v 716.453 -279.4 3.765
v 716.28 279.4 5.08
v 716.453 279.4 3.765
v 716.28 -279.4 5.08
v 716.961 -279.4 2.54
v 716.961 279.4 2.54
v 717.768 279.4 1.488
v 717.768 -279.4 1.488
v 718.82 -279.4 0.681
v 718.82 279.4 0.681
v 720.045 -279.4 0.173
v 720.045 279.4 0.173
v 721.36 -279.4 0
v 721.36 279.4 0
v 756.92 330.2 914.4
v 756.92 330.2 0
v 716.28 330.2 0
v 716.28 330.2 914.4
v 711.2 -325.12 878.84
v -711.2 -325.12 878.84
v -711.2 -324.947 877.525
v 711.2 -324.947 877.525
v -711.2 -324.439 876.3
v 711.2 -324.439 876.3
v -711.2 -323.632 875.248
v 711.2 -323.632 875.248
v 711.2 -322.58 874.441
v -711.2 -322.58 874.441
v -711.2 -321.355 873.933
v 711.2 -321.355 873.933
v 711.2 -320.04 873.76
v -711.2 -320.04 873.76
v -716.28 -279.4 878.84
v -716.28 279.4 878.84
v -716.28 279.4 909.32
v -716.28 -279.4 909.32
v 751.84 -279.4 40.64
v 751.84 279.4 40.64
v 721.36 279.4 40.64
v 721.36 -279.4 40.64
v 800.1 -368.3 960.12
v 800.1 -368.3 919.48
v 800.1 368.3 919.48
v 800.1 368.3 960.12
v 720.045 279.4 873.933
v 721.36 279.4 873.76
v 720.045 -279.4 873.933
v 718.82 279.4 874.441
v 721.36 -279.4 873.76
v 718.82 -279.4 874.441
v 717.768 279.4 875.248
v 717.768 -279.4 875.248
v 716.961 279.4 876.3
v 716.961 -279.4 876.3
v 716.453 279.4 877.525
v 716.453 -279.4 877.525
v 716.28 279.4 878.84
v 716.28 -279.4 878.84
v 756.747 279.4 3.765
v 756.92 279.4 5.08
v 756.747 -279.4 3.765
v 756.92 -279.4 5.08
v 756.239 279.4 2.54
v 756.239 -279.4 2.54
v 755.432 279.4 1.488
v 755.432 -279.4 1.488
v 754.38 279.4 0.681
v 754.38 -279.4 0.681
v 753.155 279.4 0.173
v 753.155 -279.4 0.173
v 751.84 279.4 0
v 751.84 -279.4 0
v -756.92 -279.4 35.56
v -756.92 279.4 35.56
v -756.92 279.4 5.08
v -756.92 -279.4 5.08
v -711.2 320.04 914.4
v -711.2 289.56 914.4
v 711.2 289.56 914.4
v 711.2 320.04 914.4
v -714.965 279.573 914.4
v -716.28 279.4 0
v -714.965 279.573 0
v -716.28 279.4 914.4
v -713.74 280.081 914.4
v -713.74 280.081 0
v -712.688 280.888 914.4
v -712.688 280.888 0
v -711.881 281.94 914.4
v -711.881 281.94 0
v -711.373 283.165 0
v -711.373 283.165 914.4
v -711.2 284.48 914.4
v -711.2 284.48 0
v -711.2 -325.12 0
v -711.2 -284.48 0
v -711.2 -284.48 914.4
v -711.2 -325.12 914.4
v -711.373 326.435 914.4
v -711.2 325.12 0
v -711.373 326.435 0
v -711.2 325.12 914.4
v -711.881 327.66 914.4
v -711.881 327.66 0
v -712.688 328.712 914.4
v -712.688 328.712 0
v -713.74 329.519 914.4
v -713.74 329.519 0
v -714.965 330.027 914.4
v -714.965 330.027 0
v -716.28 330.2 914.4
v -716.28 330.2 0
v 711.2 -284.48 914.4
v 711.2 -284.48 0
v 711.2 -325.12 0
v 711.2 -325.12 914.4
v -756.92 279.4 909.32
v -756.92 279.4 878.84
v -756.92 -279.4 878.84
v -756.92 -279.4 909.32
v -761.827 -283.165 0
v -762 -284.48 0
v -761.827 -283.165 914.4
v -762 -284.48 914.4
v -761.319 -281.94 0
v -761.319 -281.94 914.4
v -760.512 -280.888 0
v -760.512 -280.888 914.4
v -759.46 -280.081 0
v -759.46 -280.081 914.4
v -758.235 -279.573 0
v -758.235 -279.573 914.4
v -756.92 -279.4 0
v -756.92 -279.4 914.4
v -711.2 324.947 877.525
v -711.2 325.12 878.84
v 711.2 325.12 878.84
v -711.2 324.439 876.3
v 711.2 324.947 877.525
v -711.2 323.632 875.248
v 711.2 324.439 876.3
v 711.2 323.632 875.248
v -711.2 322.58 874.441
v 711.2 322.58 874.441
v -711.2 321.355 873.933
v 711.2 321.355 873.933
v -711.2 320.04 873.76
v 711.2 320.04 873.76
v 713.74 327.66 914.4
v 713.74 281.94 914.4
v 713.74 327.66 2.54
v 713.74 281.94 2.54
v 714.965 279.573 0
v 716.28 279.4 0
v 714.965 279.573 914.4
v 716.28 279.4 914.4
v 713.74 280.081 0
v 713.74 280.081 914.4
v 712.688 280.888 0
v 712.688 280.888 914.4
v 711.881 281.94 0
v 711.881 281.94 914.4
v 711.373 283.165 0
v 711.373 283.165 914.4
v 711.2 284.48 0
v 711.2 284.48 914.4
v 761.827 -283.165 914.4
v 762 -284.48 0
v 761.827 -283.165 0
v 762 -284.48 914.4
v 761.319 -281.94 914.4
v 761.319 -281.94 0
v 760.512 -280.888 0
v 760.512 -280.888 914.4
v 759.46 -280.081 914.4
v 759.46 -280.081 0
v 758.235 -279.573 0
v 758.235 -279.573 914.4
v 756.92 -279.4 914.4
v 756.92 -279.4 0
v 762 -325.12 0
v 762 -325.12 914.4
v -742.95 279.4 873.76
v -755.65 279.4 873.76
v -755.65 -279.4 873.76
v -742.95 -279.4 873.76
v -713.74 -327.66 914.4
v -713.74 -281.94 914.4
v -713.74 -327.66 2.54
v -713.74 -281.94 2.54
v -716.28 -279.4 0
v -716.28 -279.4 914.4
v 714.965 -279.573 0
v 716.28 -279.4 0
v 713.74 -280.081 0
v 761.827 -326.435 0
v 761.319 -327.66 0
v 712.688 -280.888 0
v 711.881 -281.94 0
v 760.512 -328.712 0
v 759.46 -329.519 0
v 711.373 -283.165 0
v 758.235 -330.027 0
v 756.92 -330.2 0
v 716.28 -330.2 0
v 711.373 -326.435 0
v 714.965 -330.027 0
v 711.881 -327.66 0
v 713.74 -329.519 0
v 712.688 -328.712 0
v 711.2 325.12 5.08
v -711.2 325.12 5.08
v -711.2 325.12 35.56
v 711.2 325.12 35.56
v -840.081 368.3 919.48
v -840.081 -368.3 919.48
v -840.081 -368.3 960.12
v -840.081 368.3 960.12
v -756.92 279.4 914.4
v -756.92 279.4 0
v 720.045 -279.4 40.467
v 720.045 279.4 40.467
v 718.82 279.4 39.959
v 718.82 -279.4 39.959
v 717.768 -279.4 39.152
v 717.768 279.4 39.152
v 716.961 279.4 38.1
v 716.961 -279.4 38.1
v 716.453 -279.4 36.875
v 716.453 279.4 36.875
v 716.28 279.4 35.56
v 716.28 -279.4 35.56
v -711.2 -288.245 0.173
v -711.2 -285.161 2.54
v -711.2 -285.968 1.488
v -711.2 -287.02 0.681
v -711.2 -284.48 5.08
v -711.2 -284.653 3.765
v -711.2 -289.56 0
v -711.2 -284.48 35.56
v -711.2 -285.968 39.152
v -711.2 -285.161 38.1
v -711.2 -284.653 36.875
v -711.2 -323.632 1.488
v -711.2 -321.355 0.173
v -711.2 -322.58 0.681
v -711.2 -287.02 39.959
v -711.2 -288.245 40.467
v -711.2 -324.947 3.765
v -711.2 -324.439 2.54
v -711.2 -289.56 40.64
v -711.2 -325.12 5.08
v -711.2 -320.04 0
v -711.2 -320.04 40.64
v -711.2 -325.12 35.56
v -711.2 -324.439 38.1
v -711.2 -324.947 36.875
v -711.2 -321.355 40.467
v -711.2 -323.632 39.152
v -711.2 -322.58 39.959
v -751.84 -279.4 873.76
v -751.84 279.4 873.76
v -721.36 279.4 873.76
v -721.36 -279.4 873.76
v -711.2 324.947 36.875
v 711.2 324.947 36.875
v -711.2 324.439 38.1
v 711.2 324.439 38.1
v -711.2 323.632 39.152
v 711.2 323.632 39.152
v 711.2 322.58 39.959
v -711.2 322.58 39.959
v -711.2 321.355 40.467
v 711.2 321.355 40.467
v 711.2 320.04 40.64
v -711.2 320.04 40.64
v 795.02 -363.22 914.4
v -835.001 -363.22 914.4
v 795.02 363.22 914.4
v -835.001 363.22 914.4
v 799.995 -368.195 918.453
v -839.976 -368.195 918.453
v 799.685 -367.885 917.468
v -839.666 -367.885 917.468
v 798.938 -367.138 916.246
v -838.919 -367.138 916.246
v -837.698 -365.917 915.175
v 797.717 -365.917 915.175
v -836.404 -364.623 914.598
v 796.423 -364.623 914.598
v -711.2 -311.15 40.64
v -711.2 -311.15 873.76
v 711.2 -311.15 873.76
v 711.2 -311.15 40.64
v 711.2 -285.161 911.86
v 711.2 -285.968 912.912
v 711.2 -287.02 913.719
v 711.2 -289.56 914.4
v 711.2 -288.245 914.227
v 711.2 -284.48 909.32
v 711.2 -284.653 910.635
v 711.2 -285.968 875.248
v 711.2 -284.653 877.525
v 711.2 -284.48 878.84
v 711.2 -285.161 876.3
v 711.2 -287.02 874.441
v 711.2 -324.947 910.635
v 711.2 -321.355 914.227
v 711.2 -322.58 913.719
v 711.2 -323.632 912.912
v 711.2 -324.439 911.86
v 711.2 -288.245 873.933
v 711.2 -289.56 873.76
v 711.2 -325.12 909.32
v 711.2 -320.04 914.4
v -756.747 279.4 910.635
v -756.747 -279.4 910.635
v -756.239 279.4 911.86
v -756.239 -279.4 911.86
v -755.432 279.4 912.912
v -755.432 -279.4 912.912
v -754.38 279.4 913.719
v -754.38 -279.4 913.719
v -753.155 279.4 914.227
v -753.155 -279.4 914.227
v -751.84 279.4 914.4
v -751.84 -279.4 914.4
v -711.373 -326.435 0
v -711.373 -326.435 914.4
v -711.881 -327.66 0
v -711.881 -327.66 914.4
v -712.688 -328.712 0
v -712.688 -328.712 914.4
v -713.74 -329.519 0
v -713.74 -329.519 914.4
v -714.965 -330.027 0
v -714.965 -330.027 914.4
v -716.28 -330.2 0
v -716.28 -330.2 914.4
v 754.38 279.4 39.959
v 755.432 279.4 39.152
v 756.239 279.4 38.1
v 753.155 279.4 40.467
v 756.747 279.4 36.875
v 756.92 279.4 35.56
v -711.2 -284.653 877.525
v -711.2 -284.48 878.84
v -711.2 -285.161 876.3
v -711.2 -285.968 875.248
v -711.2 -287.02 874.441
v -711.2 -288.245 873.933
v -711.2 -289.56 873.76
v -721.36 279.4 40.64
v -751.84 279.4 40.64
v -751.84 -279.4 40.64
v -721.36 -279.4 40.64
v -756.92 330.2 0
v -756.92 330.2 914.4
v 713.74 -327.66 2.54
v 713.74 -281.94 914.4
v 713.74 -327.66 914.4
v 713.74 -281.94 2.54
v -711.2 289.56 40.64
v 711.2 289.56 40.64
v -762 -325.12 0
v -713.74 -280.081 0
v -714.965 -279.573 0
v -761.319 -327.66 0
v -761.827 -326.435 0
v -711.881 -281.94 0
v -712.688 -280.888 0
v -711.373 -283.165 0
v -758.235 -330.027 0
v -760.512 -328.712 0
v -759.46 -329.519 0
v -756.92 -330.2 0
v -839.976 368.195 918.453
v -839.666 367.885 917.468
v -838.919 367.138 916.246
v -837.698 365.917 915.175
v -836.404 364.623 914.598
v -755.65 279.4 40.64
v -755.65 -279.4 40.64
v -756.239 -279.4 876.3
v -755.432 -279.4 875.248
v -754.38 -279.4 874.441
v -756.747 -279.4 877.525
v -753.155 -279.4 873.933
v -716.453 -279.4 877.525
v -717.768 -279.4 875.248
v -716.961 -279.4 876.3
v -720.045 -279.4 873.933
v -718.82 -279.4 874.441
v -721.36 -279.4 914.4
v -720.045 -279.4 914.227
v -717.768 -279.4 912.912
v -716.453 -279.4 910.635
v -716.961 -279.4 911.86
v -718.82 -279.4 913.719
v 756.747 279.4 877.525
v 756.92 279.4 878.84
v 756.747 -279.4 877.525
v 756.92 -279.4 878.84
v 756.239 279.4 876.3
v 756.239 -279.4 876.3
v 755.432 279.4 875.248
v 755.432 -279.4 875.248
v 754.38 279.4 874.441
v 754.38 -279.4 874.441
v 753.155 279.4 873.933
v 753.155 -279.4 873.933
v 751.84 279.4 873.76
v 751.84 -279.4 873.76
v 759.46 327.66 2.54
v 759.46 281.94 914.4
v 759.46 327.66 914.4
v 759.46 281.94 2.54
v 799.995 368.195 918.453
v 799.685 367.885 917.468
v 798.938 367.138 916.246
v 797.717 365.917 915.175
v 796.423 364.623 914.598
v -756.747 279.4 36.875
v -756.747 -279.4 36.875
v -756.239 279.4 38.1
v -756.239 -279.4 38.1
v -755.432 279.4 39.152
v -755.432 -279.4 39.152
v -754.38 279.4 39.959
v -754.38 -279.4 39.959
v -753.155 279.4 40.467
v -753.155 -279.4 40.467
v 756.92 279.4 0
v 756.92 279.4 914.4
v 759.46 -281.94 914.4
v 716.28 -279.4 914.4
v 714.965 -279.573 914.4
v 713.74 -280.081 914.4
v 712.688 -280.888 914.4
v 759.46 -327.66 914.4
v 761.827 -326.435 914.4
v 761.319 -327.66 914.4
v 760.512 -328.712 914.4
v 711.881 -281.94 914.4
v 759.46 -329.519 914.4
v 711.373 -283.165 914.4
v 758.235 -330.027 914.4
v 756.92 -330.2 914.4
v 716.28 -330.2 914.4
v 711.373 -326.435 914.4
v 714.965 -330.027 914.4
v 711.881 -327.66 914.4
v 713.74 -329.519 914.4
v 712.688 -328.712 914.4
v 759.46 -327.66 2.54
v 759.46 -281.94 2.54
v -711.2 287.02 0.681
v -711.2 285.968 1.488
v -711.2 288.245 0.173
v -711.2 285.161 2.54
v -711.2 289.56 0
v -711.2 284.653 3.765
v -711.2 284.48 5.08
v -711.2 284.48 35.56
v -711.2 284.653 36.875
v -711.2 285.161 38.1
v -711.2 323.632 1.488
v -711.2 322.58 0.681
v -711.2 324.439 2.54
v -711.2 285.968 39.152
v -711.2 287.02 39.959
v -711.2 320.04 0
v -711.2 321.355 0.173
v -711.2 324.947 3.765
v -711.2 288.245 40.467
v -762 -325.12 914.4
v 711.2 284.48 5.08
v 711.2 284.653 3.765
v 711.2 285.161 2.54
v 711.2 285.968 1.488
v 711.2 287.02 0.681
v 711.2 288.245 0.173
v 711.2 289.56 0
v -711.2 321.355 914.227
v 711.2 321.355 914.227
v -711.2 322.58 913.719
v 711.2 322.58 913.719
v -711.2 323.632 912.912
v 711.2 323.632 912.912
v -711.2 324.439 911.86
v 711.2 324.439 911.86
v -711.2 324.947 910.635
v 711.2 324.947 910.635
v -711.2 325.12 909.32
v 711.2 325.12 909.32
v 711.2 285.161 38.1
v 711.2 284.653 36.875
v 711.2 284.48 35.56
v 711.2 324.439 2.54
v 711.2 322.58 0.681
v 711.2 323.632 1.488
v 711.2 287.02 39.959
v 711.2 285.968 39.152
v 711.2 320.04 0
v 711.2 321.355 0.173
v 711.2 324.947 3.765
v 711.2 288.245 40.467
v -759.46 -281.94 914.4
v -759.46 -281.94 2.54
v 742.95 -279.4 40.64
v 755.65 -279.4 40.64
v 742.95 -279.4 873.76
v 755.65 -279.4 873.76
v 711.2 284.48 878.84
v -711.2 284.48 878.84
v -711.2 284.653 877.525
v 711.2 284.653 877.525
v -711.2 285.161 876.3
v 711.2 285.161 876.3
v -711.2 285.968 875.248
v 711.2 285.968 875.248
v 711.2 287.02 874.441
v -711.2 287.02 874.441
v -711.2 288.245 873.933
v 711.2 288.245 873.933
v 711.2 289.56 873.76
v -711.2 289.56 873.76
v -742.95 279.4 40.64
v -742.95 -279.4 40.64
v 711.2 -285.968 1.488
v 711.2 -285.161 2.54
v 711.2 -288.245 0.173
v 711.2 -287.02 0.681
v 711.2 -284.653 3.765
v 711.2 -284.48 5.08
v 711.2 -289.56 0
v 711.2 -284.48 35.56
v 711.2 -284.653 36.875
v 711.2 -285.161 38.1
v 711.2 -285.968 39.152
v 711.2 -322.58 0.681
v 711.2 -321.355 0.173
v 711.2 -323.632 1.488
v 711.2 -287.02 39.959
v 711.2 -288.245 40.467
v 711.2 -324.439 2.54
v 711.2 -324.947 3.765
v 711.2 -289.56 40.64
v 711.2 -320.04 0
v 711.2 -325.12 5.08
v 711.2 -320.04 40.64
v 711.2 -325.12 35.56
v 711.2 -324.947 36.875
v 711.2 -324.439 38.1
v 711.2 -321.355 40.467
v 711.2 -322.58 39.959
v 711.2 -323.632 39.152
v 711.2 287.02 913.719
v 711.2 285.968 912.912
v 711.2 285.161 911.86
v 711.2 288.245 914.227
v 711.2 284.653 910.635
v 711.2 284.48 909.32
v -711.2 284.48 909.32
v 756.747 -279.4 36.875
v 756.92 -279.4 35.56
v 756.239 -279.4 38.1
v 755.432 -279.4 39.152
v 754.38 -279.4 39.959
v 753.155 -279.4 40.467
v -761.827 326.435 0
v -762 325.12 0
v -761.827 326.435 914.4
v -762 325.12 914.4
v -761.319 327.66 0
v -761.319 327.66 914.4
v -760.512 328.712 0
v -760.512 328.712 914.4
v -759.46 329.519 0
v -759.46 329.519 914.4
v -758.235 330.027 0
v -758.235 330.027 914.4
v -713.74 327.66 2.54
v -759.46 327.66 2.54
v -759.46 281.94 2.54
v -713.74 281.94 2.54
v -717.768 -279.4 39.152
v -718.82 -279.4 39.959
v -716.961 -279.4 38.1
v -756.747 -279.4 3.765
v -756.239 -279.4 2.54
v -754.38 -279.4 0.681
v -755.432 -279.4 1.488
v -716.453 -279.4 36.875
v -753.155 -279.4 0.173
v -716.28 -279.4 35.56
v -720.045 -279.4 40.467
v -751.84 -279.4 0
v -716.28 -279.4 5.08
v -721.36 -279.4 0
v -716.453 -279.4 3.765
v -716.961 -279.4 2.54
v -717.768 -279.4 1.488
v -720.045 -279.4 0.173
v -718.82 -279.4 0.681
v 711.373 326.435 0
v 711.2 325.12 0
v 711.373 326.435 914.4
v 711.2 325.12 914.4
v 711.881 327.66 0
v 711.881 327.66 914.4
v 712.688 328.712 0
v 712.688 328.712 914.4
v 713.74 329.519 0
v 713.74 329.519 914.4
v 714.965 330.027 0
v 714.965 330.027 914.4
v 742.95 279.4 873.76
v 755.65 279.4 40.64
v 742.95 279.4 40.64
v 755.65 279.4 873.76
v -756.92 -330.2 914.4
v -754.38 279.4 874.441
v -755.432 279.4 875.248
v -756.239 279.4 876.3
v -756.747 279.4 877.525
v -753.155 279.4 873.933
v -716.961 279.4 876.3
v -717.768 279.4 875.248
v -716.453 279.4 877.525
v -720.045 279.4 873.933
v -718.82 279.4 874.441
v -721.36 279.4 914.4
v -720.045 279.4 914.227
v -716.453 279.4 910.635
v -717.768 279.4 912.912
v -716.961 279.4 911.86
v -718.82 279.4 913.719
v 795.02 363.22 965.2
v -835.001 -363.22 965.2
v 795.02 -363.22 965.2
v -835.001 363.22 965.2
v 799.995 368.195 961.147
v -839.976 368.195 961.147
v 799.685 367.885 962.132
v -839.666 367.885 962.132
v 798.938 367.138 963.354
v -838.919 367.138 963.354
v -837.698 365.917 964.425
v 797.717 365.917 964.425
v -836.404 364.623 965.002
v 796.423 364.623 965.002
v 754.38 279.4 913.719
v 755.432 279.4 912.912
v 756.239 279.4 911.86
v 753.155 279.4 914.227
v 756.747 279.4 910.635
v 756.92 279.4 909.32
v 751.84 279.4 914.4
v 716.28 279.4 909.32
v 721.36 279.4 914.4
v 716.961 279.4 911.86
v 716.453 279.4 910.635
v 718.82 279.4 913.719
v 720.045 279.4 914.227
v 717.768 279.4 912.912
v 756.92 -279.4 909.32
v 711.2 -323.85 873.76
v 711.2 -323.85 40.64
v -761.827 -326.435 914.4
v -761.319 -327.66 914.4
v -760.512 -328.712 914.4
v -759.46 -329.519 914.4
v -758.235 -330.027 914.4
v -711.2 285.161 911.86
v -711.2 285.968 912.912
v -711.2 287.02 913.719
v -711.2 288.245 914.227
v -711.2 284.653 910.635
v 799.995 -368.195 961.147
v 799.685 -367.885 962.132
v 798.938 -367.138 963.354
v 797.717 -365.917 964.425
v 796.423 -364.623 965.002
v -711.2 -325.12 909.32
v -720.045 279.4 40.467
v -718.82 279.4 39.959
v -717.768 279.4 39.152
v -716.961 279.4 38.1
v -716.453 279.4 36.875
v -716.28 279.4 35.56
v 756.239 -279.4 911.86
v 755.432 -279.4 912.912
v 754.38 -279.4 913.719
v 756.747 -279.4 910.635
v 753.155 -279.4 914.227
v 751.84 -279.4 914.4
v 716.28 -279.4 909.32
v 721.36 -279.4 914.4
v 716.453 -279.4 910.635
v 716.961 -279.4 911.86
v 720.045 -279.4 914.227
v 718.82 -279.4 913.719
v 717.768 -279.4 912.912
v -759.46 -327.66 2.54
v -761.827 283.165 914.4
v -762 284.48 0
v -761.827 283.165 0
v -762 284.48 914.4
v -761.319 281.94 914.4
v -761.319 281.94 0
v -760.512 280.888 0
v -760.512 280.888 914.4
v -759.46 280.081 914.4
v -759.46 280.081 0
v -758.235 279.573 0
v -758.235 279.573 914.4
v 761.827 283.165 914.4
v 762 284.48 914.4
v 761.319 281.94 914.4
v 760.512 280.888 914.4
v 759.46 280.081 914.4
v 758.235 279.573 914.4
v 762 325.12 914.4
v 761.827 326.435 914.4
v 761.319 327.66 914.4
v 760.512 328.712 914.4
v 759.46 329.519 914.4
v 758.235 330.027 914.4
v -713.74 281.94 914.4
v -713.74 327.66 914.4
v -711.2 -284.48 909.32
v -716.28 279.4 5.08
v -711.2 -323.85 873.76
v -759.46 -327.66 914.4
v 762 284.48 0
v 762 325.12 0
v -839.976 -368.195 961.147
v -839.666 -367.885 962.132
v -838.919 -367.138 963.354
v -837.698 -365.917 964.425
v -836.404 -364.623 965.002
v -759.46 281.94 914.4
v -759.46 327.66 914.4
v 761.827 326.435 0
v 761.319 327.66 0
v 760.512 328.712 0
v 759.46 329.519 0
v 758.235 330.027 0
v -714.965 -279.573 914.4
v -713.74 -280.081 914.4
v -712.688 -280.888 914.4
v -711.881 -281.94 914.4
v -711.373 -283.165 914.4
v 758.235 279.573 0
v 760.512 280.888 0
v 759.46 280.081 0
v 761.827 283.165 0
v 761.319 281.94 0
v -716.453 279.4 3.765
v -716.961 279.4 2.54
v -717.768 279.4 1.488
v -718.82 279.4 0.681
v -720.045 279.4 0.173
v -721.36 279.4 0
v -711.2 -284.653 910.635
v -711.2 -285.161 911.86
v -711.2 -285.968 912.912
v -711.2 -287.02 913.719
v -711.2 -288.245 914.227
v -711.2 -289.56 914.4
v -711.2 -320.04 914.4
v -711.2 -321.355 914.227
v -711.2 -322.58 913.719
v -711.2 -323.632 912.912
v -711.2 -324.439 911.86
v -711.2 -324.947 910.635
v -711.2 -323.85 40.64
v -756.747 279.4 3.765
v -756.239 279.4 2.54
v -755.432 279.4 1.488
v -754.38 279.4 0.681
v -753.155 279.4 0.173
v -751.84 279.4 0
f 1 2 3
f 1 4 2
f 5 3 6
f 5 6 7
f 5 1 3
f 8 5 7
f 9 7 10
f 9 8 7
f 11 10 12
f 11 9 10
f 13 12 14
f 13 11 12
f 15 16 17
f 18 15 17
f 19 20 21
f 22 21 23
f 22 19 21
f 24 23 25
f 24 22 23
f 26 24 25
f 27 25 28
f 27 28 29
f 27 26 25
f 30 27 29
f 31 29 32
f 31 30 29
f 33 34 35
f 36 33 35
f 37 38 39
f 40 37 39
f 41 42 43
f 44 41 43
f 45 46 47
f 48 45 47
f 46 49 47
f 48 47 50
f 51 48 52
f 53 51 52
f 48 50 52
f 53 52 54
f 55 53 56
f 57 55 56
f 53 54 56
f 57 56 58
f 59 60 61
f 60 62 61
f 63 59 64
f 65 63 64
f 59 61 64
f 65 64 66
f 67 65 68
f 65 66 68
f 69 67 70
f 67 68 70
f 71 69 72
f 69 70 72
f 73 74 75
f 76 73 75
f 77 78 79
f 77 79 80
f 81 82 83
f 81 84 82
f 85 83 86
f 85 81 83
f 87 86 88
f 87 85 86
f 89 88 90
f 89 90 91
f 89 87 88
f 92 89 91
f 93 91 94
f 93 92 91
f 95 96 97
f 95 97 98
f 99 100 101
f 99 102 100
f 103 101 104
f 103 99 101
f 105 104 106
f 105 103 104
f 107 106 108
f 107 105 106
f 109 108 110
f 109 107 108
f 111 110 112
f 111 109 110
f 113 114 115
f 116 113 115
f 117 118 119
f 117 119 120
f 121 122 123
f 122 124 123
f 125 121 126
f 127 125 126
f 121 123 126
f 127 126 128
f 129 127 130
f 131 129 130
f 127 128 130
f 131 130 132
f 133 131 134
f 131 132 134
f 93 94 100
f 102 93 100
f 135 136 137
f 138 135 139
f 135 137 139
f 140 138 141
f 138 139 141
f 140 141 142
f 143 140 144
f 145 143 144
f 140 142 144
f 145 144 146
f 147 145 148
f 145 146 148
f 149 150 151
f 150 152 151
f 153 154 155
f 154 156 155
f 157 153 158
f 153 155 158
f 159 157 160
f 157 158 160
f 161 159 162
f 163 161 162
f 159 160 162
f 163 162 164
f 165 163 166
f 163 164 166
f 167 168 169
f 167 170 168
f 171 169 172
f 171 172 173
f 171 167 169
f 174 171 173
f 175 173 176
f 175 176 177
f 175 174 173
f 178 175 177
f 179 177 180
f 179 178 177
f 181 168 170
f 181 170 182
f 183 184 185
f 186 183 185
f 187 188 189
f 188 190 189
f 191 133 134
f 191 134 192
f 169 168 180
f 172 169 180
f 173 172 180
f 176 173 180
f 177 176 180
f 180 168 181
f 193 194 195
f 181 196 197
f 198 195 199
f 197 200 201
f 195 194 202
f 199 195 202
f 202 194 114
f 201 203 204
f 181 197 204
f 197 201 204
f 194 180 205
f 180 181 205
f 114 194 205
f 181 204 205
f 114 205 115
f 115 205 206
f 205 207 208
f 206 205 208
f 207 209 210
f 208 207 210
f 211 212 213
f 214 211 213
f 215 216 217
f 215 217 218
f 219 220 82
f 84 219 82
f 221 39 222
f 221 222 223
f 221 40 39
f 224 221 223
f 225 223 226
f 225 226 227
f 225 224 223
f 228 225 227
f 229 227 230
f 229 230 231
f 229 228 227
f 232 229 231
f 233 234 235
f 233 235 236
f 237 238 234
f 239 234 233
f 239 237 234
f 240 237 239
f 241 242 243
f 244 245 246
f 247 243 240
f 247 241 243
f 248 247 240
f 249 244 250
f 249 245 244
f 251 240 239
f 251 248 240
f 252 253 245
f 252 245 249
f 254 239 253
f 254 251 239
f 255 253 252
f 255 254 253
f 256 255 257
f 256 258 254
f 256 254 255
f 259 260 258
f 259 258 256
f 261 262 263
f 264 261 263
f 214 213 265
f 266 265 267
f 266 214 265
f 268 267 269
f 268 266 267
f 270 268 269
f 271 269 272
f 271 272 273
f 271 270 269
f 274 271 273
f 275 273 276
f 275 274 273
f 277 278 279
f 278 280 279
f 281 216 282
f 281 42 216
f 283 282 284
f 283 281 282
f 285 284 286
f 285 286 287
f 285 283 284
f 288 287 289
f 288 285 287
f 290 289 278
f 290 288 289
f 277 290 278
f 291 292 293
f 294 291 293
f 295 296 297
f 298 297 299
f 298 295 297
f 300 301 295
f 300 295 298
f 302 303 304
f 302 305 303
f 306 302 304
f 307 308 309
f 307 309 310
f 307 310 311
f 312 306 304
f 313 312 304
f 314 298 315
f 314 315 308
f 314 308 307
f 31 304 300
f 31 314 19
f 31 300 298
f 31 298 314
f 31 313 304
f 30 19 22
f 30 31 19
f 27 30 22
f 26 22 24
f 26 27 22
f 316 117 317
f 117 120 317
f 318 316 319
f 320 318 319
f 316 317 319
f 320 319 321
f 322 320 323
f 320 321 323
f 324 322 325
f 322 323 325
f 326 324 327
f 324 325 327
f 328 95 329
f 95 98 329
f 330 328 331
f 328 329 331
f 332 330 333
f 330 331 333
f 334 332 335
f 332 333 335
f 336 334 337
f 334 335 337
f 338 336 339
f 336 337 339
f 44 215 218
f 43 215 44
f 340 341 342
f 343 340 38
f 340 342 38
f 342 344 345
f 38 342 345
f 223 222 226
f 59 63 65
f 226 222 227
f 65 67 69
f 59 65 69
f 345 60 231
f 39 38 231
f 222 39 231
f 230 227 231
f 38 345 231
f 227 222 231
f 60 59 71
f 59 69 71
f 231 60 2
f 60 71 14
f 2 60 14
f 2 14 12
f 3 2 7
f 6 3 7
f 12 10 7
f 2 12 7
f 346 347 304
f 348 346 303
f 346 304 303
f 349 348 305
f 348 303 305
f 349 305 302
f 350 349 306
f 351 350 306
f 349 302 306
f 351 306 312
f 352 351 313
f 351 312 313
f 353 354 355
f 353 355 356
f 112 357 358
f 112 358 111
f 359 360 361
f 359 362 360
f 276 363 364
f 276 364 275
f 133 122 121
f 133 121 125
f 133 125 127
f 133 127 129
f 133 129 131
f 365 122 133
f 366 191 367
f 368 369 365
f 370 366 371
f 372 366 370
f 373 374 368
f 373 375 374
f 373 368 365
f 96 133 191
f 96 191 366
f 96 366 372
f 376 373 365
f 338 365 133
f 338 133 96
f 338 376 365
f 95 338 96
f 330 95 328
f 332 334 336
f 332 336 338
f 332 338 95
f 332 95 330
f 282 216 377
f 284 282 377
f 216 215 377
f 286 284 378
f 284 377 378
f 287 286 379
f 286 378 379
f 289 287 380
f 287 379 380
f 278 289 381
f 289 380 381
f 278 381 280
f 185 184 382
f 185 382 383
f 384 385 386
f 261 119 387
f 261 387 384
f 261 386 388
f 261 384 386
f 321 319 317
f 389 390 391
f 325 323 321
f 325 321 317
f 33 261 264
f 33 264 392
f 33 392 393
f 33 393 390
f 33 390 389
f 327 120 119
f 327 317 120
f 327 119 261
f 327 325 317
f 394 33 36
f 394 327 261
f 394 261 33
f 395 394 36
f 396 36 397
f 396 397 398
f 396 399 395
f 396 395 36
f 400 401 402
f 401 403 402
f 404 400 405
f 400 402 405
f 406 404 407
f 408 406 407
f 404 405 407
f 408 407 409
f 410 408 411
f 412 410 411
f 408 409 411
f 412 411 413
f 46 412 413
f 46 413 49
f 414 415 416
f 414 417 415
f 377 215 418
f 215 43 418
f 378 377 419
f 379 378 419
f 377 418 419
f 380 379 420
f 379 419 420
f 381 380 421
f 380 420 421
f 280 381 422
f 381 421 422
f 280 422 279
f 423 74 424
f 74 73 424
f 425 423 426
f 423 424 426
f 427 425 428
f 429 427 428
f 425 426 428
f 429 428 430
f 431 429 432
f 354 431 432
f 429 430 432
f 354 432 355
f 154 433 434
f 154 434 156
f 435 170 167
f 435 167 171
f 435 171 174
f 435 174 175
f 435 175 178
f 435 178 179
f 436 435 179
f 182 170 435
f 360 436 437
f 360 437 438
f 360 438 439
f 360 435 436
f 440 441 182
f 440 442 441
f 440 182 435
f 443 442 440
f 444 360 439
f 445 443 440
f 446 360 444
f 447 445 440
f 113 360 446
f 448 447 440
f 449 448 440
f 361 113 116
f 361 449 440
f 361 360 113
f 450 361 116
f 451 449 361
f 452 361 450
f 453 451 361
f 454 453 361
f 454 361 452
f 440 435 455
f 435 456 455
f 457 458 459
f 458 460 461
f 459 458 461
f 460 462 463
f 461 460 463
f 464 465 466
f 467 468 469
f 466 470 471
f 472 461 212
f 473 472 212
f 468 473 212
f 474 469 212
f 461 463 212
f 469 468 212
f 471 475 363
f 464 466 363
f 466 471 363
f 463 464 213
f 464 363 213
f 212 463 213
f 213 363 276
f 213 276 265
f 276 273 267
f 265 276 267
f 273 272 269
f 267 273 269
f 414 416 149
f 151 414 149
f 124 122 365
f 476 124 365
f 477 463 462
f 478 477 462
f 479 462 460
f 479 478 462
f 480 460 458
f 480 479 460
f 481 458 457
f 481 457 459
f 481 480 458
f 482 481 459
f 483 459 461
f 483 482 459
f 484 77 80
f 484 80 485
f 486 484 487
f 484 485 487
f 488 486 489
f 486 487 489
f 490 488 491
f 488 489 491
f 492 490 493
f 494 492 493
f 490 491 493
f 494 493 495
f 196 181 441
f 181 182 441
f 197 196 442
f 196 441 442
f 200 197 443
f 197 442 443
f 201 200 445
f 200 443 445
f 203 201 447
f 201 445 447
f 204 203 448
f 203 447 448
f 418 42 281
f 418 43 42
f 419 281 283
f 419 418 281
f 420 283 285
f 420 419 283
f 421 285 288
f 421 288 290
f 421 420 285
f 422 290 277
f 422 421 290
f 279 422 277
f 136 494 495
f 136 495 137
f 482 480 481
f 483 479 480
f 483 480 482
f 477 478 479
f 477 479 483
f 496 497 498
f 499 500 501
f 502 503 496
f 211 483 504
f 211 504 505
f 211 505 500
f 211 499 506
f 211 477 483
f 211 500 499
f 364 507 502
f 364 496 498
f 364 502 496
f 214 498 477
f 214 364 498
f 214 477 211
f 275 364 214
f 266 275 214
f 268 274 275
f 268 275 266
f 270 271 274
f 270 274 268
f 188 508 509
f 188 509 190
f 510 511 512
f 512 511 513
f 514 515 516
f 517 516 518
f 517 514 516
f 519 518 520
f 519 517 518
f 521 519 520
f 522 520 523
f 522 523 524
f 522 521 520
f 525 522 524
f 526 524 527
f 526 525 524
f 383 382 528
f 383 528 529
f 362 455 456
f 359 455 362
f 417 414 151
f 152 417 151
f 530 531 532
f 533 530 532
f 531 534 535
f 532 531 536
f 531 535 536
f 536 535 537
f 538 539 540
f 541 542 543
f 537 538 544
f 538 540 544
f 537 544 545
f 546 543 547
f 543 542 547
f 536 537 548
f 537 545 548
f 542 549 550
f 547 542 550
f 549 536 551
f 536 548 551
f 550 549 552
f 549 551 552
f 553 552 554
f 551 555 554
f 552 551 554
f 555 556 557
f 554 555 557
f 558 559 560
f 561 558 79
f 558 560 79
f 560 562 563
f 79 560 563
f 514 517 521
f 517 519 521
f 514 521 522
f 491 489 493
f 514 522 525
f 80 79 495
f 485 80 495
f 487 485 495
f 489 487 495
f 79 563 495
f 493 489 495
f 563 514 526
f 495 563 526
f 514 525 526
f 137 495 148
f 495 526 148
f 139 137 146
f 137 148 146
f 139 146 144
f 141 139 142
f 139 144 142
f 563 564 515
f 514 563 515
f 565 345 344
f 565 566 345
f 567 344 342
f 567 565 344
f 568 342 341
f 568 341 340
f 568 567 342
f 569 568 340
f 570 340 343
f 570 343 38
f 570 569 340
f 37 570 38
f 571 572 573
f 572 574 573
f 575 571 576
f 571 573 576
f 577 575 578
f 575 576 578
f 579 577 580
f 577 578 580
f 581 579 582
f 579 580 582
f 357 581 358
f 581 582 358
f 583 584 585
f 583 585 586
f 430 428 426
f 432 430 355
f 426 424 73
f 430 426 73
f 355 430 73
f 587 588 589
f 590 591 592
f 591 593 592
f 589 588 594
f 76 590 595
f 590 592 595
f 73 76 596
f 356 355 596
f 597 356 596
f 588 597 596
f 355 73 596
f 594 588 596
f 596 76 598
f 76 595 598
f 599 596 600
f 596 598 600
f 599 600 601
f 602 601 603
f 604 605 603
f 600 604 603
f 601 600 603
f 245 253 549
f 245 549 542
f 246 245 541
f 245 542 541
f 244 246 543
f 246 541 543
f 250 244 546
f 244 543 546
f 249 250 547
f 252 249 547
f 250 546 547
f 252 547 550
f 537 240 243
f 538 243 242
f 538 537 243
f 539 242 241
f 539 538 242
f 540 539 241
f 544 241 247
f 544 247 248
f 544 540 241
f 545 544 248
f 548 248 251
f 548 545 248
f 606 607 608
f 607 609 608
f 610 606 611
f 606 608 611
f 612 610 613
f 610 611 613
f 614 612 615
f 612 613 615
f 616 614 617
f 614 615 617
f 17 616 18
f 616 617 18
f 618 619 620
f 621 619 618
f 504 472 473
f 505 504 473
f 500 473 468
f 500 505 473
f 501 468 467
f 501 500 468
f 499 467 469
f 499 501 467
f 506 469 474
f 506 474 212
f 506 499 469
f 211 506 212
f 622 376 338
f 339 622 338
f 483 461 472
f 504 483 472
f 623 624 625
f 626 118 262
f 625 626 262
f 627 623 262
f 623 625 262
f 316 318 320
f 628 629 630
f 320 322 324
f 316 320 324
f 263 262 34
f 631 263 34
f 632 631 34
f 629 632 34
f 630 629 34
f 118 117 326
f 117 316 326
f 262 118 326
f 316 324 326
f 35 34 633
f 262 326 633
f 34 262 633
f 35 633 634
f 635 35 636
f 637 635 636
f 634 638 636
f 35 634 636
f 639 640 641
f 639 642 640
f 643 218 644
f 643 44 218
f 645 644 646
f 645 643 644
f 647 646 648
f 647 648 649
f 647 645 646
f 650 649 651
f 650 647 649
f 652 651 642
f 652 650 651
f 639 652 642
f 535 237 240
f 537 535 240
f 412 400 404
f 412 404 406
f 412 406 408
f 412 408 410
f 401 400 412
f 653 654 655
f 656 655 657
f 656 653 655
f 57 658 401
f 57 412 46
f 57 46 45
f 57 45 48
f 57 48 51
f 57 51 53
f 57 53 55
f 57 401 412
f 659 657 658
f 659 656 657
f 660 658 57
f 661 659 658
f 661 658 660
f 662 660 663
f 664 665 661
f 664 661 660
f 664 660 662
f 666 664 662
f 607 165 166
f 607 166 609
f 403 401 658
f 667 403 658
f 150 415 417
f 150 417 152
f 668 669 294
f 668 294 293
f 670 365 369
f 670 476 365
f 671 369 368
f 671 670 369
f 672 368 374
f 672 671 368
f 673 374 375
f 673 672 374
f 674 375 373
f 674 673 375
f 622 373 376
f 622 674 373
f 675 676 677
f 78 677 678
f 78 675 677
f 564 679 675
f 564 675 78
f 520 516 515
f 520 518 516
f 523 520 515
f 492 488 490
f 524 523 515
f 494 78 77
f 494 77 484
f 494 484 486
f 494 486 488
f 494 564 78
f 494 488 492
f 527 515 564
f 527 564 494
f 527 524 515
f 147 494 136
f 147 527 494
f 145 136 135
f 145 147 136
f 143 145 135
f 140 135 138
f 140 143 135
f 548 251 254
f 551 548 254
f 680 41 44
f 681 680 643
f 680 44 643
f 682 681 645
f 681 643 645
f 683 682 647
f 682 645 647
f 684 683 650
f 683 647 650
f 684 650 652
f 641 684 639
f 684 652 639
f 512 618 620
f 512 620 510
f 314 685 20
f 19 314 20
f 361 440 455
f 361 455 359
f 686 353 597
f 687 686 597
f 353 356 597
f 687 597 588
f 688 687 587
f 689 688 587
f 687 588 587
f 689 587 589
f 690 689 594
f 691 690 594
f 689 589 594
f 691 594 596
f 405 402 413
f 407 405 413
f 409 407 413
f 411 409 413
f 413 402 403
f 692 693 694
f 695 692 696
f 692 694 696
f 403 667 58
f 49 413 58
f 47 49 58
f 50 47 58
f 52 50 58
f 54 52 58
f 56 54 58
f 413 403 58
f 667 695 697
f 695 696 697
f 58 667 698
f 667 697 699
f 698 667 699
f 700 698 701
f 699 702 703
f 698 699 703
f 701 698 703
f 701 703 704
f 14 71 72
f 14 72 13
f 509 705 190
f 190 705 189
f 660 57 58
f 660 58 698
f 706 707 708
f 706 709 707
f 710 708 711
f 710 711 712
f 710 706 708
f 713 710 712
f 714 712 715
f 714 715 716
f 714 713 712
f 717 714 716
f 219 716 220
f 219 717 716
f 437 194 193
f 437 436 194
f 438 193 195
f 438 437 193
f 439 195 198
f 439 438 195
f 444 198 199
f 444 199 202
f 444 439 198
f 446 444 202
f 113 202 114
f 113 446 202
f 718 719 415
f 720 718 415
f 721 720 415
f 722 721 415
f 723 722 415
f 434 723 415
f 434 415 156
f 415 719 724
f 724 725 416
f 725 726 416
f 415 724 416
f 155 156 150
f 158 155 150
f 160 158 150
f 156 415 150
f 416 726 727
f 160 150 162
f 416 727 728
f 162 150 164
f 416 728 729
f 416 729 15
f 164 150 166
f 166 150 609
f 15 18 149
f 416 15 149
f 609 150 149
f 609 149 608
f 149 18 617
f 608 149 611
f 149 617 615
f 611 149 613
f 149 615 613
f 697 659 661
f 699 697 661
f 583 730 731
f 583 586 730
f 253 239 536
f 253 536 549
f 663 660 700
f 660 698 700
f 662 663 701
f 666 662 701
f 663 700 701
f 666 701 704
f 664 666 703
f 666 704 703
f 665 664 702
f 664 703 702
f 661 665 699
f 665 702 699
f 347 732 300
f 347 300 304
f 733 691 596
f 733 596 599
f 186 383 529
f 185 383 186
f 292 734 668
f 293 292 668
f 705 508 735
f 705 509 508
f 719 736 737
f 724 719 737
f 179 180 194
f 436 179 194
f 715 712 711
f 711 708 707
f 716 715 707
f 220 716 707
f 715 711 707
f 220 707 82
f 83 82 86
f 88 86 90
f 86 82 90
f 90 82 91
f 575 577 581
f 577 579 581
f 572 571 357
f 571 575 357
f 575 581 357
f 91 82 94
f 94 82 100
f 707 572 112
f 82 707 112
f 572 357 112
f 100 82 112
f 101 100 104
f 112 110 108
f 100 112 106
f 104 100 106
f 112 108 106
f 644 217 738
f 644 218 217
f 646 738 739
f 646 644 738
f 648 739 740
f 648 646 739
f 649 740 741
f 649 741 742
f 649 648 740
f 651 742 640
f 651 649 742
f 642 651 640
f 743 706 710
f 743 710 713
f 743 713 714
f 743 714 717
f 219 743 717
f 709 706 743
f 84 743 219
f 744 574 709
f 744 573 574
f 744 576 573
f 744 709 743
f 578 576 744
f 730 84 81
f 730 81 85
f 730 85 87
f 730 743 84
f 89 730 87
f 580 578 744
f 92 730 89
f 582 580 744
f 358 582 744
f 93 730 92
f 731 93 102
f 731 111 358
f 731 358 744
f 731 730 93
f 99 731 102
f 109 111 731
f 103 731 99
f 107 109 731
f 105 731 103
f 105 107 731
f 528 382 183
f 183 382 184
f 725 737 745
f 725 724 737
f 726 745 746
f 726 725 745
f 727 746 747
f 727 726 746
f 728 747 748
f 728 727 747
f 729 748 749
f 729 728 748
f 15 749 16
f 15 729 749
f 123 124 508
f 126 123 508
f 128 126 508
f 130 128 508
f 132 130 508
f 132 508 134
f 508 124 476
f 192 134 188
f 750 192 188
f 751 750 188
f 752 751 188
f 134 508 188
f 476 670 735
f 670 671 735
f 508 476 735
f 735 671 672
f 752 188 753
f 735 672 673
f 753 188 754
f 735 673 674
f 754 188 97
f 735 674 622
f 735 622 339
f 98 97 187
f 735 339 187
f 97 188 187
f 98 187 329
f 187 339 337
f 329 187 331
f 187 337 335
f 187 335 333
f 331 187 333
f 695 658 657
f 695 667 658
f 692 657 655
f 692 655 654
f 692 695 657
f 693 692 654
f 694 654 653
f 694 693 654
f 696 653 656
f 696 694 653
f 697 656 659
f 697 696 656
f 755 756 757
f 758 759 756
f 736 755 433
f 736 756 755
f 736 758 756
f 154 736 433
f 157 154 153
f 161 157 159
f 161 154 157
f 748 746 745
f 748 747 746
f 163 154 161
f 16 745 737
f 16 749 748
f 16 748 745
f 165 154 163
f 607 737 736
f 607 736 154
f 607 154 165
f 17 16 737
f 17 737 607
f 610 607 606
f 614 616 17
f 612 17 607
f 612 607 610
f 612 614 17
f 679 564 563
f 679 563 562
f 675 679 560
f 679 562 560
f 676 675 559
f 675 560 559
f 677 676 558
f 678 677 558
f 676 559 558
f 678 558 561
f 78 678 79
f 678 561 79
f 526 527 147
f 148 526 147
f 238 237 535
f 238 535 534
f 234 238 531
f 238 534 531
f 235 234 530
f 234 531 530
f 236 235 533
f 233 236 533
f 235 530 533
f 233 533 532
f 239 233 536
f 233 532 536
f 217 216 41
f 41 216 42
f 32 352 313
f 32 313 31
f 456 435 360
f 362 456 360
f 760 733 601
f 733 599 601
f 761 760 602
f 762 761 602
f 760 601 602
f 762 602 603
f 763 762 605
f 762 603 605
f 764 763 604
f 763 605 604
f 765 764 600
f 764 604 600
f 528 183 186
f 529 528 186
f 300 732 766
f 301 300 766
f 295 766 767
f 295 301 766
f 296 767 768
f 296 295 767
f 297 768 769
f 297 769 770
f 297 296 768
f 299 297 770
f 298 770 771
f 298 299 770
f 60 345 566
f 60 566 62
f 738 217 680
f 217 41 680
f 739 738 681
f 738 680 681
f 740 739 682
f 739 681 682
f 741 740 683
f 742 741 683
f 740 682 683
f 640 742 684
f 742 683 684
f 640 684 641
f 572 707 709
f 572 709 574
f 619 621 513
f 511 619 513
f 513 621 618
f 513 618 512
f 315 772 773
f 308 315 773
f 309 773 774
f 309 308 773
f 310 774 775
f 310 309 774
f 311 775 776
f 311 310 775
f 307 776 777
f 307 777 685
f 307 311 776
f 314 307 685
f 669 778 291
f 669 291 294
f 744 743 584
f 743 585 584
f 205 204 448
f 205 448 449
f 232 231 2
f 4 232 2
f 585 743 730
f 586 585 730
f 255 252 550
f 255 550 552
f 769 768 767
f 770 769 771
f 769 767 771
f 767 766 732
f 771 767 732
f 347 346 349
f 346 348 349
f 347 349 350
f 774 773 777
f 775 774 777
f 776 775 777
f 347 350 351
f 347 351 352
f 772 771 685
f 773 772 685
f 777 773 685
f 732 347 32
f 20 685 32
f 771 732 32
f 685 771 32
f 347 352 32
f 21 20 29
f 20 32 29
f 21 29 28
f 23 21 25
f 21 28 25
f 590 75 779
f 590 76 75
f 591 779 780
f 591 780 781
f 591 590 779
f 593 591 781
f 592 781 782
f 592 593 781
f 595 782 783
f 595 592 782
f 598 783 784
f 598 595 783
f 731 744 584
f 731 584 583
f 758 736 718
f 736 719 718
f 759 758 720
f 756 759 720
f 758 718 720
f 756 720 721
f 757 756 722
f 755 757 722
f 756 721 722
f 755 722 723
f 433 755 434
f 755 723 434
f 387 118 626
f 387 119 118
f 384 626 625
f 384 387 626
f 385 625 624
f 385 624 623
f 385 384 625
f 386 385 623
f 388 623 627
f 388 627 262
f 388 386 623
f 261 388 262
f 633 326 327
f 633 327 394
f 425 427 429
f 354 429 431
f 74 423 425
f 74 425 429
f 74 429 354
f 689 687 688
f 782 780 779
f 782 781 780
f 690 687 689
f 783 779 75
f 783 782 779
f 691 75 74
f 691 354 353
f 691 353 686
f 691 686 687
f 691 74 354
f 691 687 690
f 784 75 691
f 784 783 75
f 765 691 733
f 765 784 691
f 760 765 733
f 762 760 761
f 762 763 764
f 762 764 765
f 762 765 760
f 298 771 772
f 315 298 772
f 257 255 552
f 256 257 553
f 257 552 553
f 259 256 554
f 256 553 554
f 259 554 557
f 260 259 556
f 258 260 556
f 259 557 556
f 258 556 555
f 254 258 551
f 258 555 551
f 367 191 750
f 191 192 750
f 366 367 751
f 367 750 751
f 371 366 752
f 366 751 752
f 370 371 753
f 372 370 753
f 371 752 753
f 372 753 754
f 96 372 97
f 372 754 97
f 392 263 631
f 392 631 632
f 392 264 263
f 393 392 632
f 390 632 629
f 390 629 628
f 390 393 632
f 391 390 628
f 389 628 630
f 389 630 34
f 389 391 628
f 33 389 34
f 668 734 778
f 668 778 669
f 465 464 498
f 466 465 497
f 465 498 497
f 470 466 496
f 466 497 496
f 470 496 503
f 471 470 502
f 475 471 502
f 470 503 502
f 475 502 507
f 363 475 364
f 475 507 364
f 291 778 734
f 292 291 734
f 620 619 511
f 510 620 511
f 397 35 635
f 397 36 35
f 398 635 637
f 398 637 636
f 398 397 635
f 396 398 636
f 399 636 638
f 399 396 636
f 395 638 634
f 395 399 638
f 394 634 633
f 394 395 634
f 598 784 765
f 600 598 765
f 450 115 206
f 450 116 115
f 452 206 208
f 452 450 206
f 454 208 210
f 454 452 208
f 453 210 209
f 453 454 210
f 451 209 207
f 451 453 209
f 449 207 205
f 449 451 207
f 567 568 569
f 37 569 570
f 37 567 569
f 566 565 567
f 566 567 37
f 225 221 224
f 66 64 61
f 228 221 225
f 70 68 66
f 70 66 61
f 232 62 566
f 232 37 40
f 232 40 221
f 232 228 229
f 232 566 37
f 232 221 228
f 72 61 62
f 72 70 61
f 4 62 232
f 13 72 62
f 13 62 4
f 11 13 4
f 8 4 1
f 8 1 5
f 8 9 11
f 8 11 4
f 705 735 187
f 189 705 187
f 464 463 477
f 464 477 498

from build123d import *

# Parameters (mm, degrees)
F0_W      = 50.8
F0_H      = 50.8
F1_DEPTH  = 914.4
F2_T      = -2.54
F3_R      = 5.08
F6_W      = 40.64
F6_H      = 40.64
F7_DEPTH  = 1422.4
F8_R      = 5.08
F12_W     = 40.64
F12_H     = 40.64
F13_DEPTH = 558.8
F14_R     = 5.08
F18_W     = 558.8
F18_H     = 833.12
F19_DEPTH = 12.7
F22_W     = 1422.4
F22_H     = 833.12
F23_DEPTH = 12.7
F24_W     = 1640.1810742983
F24_H     = 736.6
F25_DEPTH = 50.8
F26_R     = 5.08


with BuildPart() as f1:
    # F0 (on Top) → F1 (new body)
    with BuildSketch(Plane.XY):
        with Locations((-736.6, 304.8)):
            Rectangle(F0_W, F0_H)
    extrude(amount=F1_DEPTH)

    # F2
    f2_openings = [f1.faces().sort_by_distance(p)[0] for p in [
        (-736.6, 304.8, 914.4),
    ]]
    offset(amount=F2_T, openings=f2_openings)

    # F3
    f3_edges = [f1.edges().sort_by_distance(p)[0] for p in [
        (-762, 279.4, 457.2),
        (-762, 330.2, 457.2),
        (-711.2, 279.4, 457.2),
        (-711.2, 330.2, 457.2),
    ]]
    fillet(f3_edges, radius=F3_R)


with BuildPart() as f4_1:
    # F4: instance of F1
    add(f1.part.mirror(Plane.XZ))


with BuildPart() as f5_1:
    # F5: instance of F1
    add(f1.part.mirror(Plane.YZ))


with BuildPart() as f5_2:
    # F5: instance of F4_1
    add(f4_1.part.mirror(Plane.YZ))


with BuildPart() as f7:
    # F6 (on face) → F7 (new body, through all)
    with BuildSketch(Plane.YZ.offset(-711.2)):
        with Locations((304.8, 20.32)):
            Rectangle(F6_W, F6_H)
    extrude(amount=F7_DEPTH)

    # F8
    f8_edges = [f7.edges().sort_by_distance(p)[0] for p in [
        (0, 325.12, 40.64),
        (0, 284.48, 40.64),
        (0, 325.12, 0),
        (0, 284.48, 0),
    ]]
    fillet(f8_edges, radius=F8_R)


with BuildPart() as f10_1:
    # F10: instance of F7
    add(f7.part.mirror(Plane(origin=(736.6, 304.8, 457.2), x_dir=(1, 0, 0), z_dir=(0, 0, 1))))


with BuildPart() as f11_1:
    # F11: instance of F10_1
    add(f10_1.part.mirror(Plane.XZ))


with BuildPart() as f11_2:
    # F11: instance of F7
    add(f7.part.mirror(Plane.XZ))


with BuildPart() as f13:
    # F12 (on face) → F13 (new body, through all)
    with BuildSketch(Plane.XZ.offset(-279.4)):
        with Locations((-736.6, 894.08)):
            Rectangle(F12_W, F12_H)
    extrude(amount=F13_DEPTH)

    # F14
    f14_edges = [f13.edges().sort_by_distance(p)[0] for p in [
        (-756.92, 0, 914.4),
        (-756.92, 0, 873.76),
        (-716.28, 0, 914.4),
        (-716.28, 0, 873.76),
    ]]
    fillet(f14_edges, radius=F14_R)


with BuildPart() as f15_1:
    # F15: instance of F13
    add(f13.part.mirror(Plane(origin=(736.6, 304.8, 457.2), x_dir=(1, 0, 0), z_dir=(0, 0, 1))))


with BuildPart() as f16_1:
    # F16: instance of F13
    add(f13.part.mirror(Plane.YZ))


with BuildPart() as f16_2:
    # F16: instance of F15_1
    add(f15_1.part.mirror(Plane.YZ))


with BuildPart() as f19:
    # F18 (on offset) → F19 (new body)
    with BuildSketch(Plane(origin=(-755.65, 0, 0), x_dir=(0, -1, 0), z_dir=(-1, 0, 0))):
        with Locations((0, 457.2)):
            Rectangle(F18_W, F18_H)
    extrude(amount=-F19_DEPTH)


with BuildPart() as f20_1:
    # F20: instance of F19
    add(f19.part.mirror(Plane.YZ))


with BuildPart() as f23:
    # F22 (on offset) → F23 (new body)
    with BuildSketch(Plane.XZ.offset(323.85)):
        with Locations((0, 457.2)):
            Rectangle(F22_W, F22_H)
    extrude(amount=-F23_DEPTH)


with BuildPart() as f25:
    # F24 (on face) → F25 (new body)
    with BuildSketch(Plane.XY.offset(914.4)):
        with Locations((-19.9905371492, 0)):
            Rectangle(F24_W, F24_H)
    extrude(amount=F25_DEPTH)

    # F26
    f26_edges = [f25.edges().sort_by_distance(p)[0] for p in [
        (-19.990537, -368.3, 965.2),
        (800.1, 0, 965.2),
        (-19.990537, 368.3, 965.2),
        (-840.081074, 0, 965.2),
        (-19.990537, -368.3, 914.4),
        (800.1, 0, 914.4),
        (-19.990537, 368.3, 914.4),
        (-840.081074, 0, 914.4),
    ]]
    fillet(f26_edges, radius=F26_R)


solid = Compound([f1.part, f4_1.part, f5_1.part, f5_2.part, f7.part, f10_1.part, f11_1.part, f11_2.part, f13.part, f15_1.part, f16_1.part, f16_2.part, f19.part, f20_1.part, f23.part, f25.part])
